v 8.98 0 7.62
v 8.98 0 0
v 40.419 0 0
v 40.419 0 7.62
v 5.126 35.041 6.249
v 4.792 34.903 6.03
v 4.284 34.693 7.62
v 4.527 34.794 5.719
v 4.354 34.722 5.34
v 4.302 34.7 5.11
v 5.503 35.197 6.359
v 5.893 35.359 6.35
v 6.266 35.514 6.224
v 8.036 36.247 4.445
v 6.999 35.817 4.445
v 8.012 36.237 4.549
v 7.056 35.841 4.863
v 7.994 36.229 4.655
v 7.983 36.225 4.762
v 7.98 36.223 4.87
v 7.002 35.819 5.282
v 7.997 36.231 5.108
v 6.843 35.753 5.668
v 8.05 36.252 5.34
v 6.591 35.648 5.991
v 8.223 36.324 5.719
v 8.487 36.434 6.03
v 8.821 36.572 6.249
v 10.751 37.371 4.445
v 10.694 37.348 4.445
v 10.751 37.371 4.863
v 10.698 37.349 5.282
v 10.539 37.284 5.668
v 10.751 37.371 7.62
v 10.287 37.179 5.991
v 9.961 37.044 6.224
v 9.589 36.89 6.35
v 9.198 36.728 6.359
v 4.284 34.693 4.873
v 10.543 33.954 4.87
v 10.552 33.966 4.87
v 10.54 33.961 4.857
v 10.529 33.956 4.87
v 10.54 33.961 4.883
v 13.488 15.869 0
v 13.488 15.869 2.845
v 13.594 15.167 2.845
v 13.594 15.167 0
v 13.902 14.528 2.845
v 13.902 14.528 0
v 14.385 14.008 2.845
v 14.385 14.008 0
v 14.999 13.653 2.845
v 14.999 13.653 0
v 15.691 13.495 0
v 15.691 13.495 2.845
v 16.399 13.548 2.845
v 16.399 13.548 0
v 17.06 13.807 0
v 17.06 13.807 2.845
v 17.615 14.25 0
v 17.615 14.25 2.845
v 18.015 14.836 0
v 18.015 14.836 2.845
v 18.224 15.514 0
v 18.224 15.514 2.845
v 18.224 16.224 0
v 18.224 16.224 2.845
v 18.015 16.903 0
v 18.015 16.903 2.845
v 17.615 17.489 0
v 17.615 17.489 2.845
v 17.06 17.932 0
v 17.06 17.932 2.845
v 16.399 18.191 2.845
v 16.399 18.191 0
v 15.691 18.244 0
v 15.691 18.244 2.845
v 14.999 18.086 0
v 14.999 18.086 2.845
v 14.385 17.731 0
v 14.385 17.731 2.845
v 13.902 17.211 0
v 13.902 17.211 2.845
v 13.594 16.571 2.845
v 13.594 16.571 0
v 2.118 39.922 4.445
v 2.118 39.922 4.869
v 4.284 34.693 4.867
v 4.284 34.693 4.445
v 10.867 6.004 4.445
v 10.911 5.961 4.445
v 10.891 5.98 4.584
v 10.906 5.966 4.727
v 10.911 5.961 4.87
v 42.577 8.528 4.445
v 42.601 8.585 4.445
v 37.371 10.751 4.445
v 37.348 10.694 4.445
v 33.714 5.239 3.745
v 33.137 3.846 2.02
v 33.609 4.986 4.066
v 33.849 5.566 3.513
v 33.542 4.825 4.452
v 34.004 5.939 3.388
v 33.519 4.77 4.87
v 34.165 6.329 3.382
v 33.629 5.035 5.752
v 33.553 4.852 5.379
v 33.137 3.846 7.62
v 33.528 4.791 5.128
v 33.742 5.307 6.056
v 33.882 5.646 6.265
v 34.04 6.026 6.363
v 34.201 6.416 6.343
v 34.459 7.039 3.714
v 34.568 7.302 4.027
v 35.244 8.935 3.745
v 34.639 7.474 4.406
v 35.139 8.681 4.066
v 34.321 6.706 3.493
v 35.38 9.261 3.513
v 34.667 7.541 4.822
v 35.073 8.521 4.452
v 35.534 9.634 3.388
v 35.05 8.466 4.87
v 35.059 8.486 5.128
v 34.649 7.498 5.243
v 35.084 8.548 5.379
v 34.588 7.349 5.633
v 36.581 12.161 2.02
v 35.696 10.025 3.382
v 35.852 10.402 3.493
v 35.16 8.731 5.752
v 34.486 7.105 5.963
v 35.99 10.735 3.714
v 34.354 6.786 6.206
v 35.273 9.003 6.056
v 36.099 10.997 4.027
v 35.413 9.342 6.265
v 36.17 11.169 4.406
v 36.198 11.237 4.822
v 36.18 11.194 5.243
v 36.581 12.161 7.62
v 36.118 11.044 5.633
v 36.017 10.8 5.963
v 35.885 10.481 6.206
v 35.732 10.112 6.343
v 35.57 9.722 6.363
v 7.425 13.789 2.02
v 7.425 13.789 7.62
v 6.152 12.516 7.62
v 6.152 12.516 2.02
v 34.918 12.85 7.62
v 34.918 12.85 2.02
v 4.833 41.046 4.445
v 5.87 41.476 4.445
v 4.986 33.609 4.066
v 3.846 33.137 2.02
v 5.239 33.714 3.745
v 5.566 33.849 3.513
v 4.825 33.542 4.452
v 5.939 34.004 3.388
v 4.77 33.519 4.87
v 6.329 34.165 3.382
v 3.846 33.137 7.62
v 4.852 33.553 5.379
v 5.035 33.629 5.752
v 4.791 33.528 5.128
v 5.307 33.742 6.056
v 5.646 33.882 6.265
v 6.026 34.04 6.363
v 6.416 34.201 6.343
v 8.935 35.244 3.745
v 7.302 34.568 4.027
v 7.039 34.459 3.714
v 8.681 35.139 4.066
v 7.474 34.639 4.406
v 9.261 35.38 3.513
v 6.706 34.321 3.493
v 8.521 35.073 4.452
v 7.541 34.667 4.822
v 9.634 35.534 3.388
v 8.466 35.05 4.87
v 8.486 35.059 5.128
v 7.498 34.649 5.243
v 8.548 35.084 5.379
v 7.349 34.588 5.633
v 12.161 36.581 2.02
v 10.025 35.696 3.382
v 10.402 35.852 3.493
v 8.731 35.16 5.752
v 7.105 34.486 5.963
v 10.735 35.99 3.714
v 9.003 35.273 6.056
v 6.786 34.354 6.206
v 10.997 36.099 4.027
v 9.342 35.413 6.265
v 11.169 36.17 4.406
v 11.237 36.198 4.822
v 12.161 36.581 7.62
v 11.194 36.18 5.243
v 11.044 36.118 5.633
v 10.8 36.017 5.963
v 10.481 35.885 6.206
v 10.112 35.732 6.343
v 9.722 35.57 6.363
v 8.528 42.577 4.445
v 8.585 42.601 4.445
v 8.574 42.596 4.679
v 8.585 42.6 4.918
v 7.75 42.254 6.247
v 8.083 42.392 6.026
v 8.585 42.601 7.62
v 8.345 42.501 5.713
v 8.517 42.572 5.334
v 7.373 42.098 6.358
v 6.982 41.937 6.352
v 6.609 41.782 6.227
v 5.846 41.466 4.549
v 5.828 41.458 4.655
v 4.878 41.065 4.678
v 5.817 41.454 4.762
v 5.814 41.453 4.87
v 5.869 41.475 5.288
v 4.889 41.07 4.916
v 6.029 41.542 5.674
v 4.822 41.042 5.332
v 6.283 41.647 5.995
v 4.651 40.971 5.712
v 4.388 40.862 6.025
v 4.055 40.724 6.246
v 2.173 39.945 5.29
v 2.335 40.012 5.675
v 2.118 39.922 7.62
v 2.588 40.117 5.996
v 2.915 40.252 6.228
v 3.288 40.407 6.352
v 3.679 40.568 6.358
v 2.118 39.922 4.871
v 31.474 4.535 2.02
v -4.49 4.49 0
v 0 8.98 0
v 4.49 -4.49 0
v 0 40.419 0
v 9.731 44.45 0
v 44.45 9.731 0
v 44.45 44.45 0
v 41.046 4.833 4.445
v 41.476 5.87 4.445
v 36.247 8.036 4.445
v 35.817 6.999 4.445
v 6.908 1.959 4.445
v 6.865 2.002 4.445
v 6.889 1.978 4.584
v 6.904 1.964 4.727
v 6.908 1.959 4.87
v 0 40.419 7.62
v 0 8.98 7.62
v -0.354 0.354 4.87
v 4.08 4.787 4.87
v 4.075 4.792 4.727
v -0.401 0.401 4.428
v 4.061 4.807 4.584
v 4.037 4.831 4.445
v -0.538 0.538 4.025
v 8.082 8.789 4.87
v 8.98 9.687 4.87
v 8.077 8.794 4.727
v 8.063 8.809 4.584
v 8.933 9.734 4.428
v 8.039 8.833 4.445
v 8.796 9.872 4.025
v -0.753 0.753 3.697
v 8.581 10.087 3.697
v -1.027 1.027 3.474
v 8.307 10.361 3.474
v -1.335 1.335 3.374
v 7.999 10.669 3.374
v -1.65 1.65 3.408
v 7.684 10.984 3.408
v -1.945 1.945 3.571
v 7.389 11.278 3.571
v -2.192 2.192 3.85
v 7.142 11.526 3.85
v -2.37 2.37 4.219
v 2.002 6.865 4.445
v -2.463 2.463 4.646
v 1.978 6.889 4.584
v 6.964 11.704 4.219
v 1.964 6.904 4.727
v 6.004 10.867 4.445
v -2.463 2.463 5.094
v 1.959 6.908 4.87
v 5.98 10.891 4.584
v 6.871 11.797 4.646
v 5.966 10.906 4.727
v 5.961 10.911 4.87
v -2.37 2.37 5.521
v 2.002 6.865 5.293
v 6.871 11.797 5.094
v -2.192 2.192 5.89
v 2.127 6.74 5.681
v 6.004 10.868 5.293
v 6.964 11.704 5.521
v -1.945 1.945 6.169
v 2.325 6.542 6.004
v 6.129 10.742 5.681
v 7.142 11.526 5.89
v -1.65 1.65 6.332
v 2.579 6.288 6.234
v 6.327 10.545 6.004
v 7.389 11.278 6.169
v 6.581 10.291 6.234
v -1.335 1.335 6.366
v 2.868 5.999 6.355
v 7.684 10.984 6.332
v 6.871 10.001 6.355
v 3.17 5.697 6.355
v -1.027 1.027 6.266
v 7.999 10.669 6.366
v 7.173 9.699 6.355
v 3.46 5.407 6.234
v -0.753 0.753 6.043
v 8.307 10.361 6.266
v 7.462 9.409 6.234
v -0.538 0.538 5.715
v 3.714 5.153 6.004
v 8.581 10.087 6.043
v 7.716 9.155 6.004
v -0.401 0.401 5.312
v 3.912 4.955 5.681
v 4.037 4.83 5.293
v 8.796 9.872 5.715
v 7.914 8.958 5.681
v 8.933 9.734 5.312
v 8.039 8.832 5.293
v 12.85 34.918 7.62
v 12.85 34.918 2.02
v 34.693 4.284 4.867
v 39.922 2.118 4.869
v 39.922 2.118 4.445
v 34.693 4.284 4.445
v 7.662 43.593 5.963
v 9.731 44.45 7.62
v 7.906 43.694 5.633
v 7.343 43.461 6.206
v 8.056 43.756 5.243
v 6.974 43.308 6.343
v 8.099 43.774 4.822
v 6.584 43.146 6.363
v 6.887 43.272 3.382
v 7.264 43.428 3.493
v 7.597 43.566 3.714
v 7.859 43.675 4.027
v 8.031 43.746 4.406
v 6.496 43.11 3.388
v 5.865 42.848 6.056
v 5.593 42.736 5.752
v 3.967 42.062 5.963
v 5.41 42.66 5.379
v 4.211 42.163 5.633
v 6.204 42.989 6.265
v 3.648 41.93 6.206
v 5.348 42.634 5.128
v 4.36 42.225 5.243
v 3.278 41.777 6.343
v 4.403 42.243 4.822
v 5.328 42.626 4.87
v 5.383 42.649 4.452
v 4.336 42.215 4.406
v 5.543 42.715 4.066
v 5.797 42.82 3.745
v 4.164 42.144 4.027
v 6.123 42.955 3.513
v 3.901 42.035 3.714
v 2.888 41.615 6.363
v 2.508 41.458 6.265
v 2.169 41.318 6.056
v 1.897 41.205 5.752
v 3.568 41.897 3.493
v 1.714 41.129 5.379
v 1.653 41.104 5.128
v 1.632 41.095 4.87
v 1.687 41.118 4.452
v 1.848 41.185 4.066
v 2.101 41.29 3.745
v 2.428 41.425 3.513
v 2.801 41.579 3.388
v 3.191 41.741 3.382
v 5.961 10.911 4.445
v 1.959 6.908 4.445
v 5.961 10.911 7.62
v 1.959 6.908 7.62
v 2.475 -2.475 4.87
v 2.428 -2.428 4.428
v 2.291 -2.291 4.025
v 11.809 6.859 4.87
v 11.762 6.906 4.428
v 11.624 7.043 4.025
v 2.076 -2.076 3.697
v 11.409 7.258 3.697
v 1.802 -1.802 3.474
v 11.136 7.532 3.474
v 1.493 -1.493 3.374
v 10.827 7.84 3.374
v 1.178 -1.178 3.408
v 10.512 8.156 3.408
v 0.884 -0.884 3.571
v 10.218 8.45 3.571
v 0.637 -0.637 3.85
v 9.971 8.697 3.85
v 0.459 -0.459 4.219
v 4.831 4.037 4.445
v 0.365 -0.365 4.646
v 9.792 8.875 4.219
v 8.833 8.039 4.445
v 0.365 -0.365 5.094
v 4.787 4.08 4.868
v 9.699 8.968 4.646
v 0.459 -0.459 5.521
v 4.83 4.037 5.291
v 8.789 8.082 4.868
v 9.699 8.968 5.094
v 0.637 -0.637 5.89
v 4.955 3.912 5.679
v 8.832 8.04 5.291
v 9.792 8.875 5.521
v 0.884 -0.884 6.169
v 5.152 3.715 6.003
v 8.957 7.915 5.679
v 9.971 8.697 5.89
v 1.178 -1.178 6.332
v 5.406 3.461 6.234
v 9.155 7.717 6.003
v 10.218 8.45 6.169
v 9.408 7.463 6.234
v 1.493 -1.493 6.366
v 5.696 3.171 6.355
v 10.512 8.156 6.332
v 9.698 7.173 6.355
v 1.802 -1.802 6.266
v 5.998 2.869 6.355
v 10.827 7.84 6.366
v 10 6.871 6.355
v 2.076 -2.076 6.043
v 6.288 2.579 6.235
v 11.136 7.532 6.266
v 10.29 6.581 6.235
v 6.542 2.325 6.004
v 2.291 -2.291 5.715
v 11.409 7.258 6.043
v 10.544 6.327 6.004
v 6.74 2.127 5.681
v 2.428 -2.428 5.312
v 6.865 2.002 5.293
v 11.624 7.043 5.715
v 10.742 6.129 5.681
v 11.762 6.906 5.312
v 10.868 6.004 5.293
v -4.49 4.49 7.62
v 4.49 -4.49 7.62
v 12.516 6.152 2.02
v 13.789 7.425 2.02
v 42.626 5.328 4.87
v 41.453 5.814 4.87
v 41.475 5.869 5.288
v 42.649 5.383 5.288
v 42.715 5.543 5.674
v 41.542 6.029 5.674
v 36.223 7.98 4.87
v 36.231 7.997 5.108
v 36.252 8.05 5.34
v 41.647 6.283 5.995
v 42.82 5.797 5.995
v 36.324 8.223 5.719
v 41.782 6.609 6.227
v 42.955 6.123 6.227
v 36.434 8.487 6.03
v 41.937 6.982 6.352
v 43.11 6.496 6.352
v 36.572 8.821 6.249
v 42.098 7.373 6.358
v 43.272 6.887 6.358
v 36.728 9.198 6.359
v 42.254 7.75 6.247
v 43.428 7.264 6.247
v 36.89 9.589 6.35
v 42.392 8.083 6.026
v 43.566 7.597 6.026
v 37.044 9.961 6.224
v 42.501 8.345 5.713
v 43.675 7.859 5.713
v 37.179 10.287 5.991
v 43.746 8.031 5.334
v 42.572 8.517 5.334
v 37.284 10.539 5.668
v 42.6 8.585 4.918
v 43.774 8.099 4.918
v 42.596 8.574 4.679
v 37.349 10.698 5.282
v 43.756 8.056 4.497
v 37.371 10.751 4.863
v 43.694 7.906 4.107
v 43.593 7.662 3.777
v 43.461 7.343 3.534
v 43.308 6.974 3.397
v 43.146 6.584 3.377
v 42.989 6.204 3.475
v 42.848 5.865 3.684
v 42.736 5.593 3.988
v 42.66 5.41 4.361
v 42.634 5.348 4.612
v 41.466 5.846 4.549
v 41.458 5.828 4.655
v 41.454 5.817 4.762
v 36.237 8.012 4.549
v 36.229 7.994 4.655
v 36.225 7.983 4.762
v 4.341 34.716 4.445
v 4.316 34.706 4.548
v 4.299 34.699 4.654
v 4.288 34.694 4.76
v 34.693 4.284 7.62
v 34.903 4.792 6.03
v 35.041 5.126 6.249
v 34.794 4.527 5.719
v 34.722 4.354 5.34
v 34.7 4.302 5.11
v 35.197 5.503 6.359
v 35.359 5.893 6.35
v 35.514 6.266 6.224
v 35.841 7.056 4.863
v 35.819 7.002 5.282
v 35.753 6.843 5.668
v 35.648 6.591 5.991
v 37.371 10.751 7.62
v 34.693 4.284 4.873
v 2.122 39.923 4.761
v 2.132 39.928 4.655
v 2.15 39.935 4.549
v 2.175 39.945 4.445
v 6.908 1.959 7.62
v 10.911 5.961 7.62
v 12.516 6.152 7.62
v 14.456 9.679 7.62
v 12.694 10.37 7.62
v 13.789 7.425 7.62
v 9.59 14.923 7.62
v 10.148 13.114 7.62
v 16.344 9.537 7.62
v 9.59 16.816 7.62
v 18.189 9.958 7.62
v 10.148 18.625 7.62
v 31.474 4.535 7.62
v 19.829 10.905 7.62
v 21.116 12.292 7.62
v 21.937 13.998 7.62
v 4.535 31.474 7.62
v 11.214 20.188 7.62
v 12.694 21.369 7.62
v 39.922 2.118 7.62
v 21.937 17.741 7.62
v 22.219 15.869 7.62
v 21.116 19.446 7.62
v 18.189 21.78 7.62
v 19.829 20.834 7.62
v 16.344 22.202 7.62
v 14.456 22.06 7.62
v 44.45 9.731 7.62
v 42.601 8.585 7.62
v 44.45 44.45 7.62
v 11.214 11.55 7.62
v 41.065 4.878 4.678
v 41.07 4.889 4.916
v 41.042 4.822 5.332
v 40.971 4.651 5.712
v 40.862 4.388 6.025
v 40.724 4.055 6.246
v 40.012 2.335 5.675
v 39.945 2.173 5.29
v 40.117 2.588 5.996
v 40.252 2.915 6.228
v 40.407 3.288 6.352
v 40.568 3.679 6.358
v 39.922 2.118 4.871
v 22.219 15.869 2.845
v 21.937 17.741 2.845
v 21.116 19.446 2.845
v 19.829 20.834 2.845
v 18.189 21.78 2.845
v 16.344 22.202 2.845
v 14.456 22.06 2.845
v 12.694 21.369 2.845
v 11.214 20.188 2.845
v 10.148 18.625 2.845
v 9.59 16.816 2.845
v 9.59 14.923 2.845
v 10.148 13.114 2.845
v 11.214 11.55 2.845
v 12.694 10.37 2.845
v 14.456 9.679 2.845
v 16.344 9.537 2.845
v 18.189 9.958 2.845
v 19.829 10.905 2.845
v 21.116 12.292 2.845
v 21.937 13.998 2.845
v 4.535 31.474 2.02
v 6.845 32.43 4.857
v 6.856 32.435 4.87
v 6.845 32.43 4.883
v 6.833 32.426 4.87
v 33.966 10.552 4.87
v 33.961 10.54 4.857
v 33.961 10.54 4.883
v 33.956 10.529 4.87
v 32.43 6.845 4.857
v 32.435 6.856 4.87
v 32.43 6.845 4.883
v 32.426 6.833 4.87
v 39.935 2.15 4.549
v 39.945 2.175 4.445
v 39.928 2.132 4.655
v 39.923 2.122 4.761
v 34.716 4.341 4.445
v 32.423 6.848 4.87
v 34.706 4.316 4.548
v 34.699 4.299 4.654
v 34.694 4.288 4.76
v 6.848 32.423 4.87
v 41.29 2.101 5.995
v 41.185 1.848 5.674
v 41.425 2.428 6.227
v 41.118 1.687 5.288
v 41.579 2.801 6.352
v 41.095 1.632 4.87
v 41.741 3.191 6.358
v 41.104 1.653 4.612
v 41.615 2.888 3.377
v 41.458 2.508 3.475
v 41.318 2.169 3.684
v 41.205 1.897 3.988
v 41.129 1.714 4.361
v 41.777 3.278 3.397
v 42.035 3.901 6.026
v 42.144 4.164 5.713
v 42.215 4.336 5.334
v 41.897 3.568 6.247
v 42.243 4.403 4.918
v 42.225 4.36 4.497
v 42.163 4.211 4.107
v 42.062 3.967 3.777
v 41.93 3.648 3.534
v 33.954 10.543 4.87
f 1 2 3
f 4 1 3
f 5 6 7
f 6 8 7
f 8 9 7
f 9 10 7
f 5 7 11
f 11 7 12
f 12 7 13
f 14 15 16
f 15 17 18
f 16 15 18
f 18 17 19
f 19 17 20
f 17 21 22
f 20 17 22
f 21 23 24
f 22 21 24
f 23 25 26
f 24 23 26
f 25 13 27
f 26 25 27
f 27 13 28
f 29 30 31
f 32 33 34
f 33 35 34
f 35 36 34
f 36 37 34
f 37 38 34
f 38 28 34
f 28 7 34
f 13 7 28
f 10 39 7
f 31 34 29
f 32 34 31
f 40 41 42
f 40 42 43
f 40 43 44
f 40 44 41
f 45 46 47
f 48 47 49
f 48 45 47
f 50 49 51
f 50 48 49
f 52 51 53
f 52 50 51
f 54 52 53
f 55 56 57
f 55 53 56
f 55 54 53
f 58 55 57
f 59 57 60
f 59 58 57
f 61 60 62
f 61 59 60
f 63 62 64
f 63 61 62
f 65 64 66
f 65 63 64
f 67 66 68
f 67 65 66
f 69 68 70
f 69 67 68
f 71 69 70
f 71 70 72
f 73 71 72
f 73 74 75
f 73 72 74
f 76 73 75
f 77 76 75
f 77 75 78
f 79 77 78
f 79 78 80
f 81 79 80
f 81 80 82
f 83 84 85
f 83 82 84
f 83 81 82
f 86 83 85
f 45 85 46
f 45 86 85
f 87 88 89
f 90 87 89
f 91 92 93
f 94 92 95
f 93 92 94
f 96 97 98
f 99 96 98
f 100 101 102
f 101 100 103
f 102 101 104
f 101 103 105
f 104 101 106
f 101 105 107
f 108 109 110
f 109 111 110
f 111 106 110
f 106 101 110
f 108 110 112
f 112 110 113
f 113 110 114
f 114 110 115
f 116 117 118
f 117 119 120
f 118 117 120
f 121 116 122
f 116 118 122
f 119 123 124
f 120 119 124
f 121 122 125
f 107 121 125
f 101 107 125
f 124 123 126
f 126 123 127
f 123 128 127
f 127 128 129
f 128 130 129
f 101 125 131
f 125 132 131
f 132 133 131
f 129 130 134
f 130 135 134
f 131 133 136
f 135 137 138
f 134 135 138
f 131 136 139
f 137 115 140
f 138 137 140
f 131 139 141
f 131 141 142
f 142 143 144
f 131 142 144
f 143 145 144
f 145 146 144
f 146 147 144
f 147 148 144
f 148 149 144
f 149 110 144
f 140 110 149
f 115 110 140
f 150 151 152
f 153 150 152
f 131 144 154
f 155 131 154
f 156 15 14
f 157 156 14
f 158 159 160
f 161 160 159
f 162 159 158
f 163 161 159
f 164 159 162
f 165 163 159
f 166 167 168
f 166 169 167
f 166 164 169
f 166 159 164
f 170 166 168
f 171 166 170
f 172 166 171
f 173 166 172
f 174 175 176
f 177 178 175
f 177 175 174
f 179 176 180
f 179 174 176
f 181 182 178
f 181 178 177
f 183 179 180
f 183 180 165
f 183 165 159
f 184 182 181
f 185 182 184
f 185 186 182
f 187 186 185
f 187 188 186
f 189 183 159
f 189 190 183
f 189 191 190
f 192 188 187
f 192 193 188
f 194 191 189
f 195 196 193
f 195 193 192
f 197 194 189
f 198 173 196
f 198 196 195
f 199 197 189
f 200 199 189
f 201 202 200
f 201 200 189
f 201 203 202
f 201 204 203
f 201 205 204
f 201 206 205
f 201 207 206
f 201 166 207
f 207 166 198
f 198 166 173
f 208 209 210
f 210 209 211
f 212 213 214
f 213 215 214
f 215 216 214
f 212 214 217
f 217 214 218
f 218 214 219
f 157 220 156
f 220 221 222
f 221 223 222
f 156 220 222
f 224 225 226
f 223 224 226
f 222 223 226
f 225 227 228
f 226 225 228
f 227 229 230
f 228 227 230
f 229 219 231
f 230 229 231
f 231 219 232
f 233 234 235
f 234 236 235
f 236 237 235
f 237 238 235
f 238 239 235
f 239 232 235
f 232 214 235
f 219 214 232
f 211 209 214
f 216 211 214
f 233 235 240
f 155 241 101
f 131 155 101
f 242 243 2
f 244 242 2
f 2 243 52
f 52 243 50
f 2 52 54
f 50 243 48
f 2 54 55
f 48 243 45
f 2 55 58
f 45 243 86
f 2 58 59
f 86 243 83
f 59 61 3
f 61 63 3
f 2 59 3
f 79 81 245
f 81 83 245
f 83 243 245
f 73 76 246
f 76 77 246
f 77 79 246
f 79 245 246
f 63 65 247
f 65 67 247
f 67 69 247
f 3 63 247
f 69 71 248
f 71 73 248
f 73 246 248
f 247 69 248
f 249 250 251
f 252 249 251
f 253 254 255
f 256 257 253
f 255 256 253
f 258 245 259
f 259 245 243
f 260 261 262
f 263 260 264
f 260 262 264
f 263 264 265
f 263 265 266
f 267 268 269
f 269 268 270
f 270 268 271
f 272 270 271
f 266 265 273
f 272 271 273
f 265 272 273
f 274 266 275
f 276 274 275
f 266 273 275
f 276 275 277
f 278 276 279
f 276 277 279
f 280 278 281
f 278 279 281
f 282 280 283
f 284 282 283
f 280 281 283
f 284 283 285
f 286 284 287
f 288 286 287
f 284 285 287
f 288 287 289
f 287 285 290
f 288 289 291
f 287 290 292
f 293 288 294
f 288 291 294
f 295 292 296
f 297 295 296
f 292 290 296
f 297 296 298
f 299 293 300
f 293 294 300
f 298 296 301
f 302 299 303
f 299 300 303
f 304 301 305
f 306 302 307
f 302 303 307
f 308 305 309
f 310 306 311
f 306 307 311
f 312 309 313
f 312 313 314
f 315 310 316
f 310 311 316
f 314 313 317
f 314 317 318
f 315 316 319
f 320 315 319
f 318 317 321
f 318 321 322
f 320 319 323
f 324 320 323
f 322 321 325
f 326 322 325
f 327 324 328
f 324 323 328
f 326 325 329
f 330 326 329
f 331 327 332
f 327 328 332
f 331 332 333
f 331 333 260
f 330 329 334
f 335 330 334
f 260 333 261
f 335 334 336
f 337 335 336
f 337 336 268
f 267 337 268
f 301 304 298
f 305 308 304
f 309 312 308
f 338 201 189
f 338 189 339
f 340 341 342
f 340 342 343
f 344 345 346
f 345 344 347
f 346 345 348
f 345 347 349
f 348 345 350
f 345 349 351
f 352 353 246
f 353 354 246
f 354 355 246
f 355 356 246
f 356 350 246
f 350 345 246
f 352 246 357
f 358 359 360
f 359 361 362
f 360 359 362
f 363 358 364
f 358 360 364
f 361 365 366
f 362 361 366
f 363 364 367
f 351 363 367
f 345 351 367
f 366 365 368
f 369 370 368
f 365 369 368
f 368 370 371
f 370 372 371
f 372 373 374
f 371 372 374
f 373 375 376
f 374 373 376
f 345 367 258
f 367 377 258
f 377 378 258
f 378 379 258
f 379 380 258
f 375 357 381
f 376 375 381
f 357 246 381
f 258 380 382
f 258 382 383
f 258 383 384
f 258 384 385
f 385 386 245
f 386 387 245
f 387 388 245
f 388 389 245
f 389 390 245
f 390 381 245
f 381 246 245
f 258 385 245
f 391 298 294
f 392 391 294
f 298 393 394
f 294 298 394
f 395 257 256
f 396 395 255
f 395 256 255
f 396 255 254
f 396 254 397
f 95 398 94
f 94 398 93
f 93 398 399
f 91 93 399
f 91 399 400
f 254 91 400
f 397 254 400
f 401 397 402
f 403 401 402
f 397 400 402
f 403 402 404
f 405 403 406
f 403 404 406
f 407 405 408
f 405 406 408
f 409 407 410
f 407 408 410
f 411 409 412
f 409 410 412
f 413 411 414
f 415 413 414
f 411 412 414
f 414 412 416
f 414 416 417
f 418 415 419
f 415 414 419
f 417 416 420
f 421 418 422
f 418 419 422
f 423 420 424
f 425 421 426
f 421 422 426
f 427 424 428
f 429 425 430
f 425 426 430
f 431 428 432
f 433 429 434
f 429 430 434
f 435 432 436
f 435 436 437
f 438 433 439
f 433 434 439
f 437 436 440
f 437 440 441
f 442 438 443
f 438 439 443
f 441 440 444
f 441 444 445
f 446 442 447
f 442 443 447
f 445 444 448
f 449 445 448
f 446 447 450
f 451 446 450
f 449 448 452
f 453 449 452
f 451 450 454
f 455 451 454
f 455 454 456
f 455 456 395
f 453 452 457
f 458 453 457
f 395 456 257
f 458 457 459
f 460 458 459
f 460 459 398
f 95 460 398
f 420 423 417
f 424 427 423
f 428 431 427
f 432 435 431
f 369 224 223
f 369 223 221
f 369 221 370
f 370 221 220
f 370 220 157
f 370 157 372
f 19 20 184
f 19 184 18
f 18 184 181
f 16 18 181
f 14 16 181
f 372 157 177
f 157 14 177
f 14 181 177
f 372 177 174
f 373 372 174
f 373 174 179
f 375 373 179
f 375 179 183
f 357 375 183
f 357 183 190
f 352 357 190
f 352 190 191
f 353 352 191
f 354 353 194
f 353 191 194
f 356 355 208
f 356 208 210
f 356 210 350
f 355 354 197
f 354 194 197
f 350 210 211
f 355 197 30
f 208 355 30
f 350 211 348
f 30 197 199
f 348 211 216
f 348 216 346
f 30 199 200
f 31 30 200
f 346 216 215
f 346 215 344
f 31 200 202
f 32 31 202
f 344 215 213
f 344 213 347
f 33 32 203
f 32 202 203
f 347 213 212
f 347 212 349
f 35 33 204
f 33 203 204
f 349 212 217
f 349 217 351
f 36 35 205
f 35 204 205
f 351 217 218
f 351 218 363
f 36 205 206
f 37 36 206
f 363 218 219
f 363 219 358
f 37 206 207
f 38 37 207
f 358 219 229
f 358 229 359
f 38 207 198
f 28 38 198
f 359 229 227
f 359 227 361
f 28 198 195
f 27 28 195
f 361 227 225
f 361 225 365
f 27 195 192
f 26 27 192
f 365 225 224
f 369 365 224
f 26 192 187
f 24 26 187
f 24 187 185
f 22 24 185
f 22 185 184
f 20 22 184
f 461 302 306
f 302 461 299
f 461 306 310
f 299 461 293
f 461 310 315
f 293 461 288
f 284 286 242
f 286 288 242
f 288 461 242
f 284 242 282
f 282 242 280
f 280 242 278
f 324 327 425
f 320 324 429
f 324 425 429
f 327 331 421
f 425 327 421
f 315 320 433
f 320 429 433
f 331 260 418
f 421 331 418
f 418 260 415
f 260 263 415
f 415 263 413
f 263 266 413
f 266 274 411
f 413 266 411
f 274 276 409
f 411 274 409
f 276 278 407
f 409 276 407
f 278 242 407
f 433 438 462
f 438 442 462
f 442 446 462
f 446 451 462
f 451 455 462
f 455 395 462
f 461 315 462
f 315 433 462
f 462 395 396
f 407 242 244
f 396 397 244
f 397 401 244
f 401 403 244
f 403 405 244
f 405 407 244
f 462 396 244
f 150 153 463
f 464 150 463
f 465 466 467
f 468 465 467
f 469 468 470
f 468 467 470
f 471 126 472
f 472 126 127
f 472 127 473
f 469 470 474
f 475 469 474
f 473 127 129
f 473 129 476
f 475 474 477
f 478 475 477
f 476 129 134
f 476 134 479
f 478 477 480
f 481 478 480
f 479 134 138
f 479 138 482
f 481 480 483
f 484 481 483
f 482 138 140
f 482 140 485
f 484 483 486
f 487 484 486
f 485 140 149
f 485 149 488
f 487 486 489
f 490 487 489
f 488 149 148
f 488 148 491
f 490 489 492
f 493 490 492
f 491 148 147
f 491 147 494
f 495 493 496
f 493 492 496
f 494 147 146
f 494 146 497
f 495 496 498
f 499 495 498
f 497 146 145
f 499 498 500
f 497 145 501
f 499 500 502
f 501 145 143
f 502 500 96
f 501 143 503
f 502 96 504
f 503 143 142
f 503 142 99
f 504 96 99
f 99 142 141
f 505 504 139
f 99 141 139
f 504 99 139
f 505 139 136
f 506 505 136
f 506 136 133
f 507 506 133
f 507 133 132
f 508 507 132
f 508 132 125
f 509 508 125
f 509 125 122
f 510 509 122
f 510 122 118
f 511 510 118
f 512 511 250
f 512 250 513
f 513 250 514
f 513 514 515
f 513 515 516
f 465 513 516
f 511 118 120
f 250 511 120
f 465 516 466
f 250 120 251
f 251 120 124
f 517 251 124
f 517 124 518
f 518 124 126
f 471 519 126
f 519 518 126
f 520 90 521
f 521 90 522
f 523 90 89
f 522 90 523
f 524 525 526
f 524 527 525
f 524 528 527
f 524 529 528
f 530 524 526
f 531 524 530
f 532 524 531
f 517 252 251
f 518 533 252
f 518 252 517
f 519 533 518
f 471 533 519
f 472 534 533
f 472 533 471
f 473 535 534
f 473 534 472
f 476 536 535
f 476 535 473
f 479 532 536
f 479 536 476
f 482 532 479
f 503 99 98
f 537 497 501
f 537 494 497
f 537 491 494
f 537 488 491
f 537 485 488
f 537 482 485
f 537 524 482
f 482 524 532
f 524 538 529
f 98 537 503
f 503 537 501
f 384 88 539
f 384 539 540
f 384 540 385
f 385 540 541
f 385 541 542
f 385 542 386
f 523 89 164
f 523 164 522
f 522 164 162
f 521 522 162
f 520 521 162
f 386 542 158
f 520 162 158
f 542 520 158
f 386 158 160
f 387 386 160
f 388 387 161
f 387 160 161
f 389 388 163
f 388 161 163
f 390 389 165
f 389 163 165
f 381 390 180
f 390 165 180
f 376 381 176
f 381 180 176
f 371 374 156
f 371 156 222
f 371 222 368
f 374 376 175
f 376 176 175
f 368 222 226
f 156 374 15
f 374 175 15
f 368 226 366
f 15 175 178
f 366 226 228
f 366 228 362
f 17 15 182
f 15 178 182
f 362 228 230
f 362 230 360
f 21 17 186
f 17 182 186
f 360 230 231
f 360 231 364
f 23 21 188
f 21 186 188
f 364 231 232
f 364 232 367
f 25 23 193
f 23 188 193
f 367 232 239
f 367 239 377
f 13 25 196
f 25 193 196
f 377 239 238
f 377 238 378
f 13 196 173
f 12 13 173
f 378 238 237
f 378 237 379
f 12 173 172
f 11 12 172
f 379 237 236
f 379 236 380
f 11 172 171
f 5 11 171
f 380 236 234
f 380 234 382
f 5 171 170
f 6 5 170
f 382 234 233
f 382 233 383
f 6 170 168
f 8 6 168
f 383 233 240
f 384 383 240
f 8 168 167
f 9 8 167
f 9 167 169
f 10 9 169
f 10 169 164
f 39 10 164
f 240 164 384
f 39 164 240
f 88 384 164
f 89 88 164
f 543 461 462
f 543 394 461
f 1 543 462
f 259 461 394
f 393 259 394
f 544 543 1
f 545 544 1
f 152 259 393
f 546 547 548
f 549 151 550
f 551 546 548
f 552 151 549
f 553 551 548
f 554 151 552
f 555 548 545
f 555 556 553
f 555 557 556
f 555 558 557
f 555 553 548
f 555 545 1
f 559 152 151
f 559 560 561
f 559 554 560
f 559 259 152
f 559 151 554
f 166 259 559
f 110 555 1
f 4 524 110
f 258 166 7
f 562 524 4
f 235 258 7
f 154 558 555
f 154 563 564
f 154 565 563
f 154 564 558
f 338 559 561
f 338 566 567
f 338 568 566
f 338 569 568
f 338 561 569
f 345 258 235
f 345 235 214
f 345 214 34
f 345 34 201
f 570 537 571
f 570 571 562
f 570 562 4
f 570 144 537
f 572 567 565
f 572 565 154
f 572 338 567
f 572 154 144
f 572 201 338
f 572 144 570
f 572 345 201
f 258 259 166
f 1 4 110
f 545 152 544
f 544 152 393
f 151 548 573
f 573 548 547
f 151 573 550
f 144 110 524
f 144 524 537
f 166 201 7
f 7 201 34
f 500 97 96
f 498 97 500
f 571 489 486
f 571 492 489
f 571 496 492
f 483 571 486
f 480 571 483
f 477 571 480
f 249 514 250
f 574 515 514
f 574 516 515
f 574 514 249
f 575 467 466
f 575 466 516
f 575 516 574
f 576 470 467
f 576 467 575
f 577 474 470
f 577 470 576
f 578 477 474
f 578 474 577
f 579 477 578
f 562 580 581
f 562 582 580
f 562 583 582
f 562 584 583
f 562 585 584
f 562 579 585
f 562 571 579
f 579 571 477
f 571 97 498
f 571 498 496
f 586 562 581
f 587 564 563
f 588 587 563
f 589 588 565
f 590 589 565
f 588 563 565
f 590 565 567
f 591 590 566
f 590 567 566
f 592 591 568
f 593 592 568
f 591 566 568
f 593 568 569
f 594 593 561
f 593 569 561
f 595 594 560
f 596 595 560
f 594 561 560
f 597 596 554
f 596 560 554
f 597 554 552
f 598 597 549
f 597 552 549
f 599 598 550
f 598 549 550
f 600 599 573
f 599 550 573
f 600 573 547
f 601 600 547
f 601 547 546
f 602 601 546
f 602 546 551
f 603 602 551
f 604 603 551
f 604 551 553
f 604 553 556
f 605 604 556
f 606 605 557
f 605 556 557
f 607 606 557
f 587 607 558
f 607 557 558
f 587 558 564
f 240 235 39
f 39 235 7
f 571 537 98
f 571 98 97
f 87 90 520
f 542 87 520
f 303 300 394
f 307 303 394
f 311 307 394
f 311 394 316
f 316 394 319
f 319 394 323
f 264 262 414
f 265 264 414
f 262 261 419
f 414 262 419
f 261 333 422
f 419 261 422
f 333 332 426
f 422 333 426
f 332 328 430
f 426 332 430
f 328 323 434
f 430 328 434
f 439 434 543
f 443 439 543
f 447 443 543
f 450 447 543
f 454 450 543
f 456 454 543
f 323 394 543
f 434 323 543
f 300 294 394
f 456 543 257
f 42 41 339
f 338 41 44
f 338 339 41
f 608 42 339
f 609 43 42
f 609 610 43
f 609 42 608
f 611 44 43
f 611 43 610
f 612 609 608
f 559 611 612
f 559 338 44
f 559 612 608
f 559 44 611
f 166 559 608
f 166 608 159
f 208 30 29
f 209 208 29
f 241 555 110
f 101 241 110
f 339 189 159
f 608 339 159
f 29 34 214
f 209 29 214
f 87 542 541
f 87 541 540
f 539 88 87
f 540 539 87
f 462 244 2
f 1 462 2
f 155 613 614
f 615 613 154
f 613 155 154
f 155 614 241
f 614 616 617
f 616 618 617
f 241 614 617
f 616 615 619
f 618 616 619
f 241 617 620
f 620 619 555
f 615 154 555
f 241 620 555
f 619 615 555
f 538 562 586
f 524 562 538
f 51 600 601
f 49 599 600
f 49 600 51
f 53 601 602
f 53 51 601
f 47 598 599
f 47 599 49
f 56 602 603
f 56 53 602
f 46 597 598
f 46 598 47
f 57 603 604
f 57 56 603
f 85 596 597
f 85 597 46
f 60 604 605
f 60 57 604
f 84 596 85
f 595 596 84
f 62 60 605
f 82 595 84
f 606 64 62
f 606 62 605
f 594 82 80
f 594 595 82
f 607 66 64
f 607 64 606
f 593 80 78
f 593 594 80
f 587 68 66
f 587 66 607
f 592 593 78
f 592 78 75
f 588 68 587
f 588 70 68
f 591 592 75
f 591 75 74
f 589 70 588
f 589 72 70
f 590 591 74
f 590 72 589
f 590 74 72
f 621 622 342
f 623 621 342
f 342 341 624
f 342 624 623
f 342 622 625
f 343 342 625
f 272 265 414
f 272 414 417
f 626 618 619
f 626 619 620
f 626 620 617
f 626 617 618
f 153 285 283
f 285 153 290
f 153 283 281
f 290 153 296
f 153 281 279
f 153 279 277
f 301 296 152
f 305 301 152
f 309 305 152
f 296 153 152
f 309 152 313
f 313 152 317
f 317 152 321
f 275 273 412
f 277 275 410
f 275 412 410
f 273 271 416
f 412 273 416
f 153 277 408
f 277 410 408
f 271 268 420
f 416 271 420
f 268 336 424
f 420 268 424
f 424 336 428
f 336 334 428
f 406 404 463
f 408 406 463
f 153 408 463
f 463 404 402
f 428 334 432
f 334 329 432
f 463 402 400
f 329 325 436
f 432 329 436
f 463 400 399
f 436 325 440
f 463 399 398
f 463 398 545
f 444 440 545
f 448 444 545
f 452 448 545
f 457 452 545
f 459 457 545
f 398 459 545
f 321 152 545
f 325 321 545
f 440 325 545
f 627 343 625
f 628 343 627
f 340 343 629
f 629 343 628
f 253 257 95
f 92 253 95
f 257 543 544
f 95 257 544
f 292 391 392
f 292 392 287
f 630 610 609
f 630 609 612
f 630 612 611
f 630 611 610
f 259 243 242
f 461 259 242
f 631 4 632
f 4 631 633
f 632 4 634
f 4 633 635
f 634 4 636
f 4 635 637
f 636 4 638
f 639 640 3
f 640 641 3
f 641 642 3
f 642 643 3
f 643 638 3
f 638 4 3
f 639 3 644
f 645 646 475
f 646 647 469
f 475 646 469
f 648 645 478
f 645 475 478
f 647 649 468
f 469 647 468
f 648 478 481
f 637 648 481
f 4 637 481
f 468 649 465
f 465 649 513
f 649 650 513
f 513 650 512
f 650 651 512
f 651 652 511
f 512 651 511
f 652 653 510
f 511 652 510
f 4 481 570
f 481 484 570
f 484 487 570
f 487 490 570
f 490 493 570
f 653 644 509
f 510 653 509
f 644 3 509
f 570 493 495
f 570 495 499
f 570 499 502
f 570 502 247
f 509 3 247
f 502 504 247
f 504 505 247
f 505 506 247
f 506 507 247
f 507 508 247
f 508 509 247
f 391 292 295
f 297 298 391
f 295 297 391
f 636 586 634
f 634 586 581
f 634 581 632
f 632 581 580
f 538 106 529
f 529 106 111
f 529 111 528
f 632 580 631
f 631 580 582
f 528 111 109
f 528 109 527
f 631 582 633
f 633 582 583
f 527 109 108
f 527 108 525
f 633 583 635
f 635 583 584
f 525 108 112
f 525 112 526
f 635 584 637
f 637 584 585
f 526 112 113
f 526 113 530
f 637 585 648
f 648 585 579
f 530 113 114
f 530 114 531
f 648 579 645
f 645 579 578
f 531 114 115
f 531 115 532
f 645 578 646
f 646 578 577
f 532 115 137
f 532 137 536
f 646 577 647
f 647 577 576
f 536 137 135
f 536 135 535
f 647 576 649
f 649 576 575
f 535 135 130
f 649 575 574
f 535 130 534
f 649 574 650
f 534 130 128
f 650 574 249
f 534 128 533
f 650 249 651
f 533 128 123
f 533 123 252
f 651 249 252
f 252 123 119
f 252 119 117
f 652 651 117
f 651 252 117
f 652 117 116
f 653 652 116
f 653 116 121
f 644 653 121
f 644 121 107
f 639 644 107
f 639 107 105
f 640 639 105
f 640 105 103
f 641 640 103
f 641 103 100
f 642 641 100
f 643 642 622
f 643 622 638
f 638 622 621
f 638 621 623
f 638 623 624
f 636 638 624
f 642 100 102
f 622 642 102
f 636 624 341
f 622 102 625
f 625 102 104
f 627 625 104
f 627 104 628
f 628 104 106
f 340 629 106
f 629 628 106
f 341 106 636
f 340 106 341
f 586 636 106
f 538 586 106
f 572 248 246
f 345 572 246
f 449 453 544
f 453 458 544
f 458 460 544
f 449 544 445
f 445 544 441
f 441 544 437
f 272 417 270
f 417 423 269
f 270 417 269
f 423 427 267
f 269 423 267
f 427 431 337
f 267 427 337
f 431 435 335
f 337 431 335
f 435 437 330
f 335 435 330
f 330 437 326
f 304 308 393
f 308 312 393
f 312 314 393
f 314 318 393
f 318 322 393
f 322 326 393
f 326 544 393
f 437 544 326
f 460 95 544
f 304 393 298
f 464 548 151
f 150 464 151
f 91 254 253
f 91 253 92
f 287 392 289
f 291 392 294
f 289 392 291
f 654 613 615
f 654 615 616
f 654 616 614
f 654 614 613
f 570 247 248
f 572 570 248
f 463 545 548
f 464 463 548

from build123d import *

# Parameters (mm, degrees)
SKETCH1_R                           = 2.38125
BOSS_EXTRUDE1_DEPTH                 = 7.62
MAGNET_START                        = 7.62
SKETCH1_3_R                         = 6.35
MAGNET_HOLE_DEPTH                   = 4.7752
CUT_EXTRUDE2_START                  = 7.62
CUT_EXTRUDE2_DEPTH                  = 5.6
F_3_0MM_DOWEL_HOLE1_D               = 3
F_3_0MM_DOWEL_HOLE1_DEPTH           = 9.106309071
F_3_0MM_DOWEL_HOLE1_TIP             = 0.901290929
F_3_0MM_DOWEL_HOLE1_ON_FACE_2_D     = 3
F_3_0MM_DOWEL_HOLE1_ON_FACE_2_DEPTH = 9.106309071
F_3_0MM_DOWEL_HOLE1_ON_FACE_2_TIP   = 0.901290929
F_3_0MM_DOWEL_HOLE1_ON_FACE_3_D     = 3
F_3_0MM_DOWEL_HOLE1_ON_FACE_3_DEPTH = 9.106309071
F_3_0MM_DOWEL_HOLE1_ON_FACE_3_TIP   = 0.901290929
F_3_0MM_DOWEL_HOLE1_ON_FACE_4_D     = 3
F_3_0MM_DOWEL_HOLE1_ON_FACE_4_DEPTH = 9.106309071
F_3_0MM_DOWEL_HOLE1_ON_FACE_4_TIP   = 0.901290929
F_3_0MM_DOWEL_HOLE1_ON_FACE_5_D     = 3
F_3_0MM_DOWEL_HOLE1_ON_FACE_5_DEPTH = 9.106309071
F_3_0MM_DOWEL_HOLE1_ON_FACE_5_TIP   = 0.901290929
F_3_0MM_DOWEL_HOLE2_D               = 3
F_3_0MM_DOWEL_HOLE2_DEPTH           = 13.2
CUT_EXTRUDE3_START                  = 7.62
CUT_EXTRUDE3_DEPTH                  = 3.175


with BuildPart() as part:
    # Sketch1 → Boss-Extrude1 (new body)
    with BuildSketch(Plane.XY):
        Polygon((44.45, 44.45), (9.731339272, 44.45), (0, 40.419147293), (0, 8.980256121), (-4.490128061, 4.490128061), (4.490128061, -4.490128061), (8.980256121, 0), (40.419147293, 0), (44.45, 9.731339272), align=None)
        with Locations(Location((15.869346859, 15.869346859, 0), (0, 0, 180))):
            Circle(SKETCH1_R, mode=Mode.SUBTRACT)
    extrude(amount=BOSS_EXTRUDE1_DEPTH)

    # Sketch1<3> → Magnet Hole (cut)
    with BuildSketch(Plane.XY.offset(MAGNET_START)):
        with Locations((15.869346859, 15.869346859)):
            Circle(SKETCH1_3_R)
    extrude(amount=-MAGNET_HOLE_DEPTH, mode=Mode.SUBTRACT)

    # Sketch1<4> → Cut-Extrude2 (cut)
    with BuildSketch(Plane.XY.offset(CUT_EXTRUDE2_START)):
        Polygon((36.580836926, 12.161131678), (34.917853767, 12.849961856), (31.473702876, 4.535046063), (33.136686034, 3.846215885), align=None)
        Polygon((6.151828996, 12.515790027), (12.515790027, 6.151828996), (13.788582233, 7.424621202), (7.424621202, 13.788582233), align=None)
        Polygon((12.161131678, 36.580836926), (12.849961856, 34.917853767), (4.535046063, 31.473702876), (3.846215885, 33.136686034), align=None)
    extrude(amount=-CUT_EXTRUDE2_DEPTH, mode=Mode.SUBTRACT)

    # Ø3.0mm Dowel Hole1
    with Locations(Plane(origin=(-1.414213562, 1.414213562, 4.87), x_dir=(-0.707106781187, 0.707106781187, 0), z_dir=(-0.707106781187, -0.707106781187, 0))):
        with Locations((1e-09, 0), (-3.999999999, 0)):
            Hole(F_3_0MM_DOWEL_HOLE1_D / 2, depth=F_3_0MM_DOWEL_HOLE1_DEPTH)
            with Locations((0, 0, -(F_3_0MM_DOWEL_HOLE1_DEPTH + F_3_0MM_DOWEL_HOLE1_TIP / 2))):  # 118° drill point
                Cone(0, F_3_0MM_DOWEL_HOLE1_D / 2, F_3_0MM_DOWEL_HOLE1_TIP, mode=Mode.SUBTRACT)

    # Ø3.0mm Dowel Hole1 on face 2
    with Locations(Plane(origin=(43.199940511, 6.713428701, 4.87), x_dir=(0.382682898036, 0.923879753837, 0), z_dir=(0.923879753837, -0.382682898036, 0))):
        with Locations((0, 0)):
            Hole(F_3_0MM_DOWEL_HOLE1_ON_FACE_2_D / 2, depth=F_3_0MM_DOWEL_HOLE1_ON_FACE_2_DEPTH)
            with Locations((0, 0, -(F_3_0MM_DOWEL_HOLE1_ON_FACE_2_DEPTH + F_3_0MM_DOWEL_HOLE1_ON_FACE_2_TIP / 2))):  # 118° drill point
                Cone(0, F_3_0MM_DOWEL_HOLE1_ON_FACE_2_D / 2, F_3_0MM_DOWEL_HOLE1_ON_FACE_2_TIP, mode=Mode.SUBTRACT)

    # Ø3.0mm Dowel Hole1 on face 3
    with Locations(Plane(origin=(41.669206782, 3.017910571, 4.87), x_dir=(0.382682898036, 0.923879753837, 0), z_dir=(0.923879753837, -0.382682898036, 0))):
        with Locations((0, 0)):
            Hole(F_3_0MM_DOWEL_HOLE1_ON_FACE_3_D / 2, depth=F_3_0MM_DOWEL_HOLE1_ON_FACE_3_DEPTH)
            with Locations((0, 0, -(F_3_0MM_DOWEL_HOLE1_ON_FACE_3_DEPTH + F_3_0MM_DOWEL_HOLE1_ON_FACE_3_TIP / 2))):  # 118° drill point
                Cone(0, F_3_0MM_DOWEL_HOLE1_ON_FACE_3_D / 2, F_3_0MM_DOWEL_HOLE1_ON_FACE_3_TIP, mode=Mode.SUBTRACT)

    # Ø3.0mm Dowel Hole1 on face 4
    with Locations(Plane(origin=(3.017910571, 41.669206782, 4.87), x_dir=(0.923879753837, 0.382682898036, 0), z_dir=(-0.382682898036, 0.923879753837, 0))):
        with Locations((0, 0)):
            Hole(F_3_0MM_DOWEL_HOLE1_ON_FACE_4_D / 2, depth=F_3_0MM_DOWEL_HOLE1_ON_FACE_4_DEPTH)
            with Locations((0, 0, -(F_3_0MM_DOWEL_HOLE1_ON_FACE_4_DEPTH + F_3_0MM_DOWEL_HOLE1_ON_FACE_4_TIP / 2))):  # 118° drill point
                Cone(0, F_3_0MM_DOWEL_HOLE1_ON_FACE_4_D / 2, F_3_0MM_DOWEL_HOLE1_ON_FACE_4_TIP, mode=Mode.SUBTRACT)

    # Ø3.0mm Dowel Hole1 on face 5
    with Locations(Plane(origin=(6.713428701, 43.199940511, 4.87), x_dir=(0.923879753837, 0.382682898036, 0), z_dir=(-0.382682898036, 0.923879753837, 0))):
        with Locations((0, 0)):
            Hole(F_3_0MM_DOWEL_HOLE1_ON_FACE_5_D / 2, depth=F_3_0MM_DOWEL_HOLE1_ON_FACE_5_DEPTH)
            with Locations((0, 0, -(F_3_0MM_DOWEL_HOLE1_ON_FACE_5_DEPTH + F_3_0MM_DOWEL_HOLE1_ON_FACE_5_TIP / 2))):  # 118° drill point
                Cone(0, F_3_0MM_DOWEL_HOLE1_ON_FACE_5_D / 2, F_3_0MM_DOWEL_HOLE1_ON_FACE_5_TIP, mode=Mode.SUBTRACT)

    # Ø3.0mm Dowel Hole2
    with Locations(Plane(origin=(0, 0, 0), x_dir=(-0.7071067811865495, 0.7071067811865457, 0), z_dir=(-0.7071067811865457, -0.7071067811865495, 0))):
        with Locations((-2, -4.87), (2, -4.87)):
            Hole(F_3_0MM_DOWEL_HOLE2_D / 2, depth=F_3_0MM_DOWEL_HOLE2_DEPTH)

    # Sketch1<5> → Cut-Extrude3 (cut)
    with BuildSketch(Plane.XY.offset(CUT_EXTRUDE3_START)):
        Polygon((5.960910165, 10.910657634), (1.958685784, 6.908433252), (6.908433252, 1.958685784), (10.910657634, 5.960910165), align=None)
        Polygon((2.118099231, 39.921854627), (4.284087459, 34.692696473), (10.751244186, 37.3714805), (8.585255959, 42.600638654), align=None)
        Polygon((37.3714805, 10.751244186), (42.600638654, 8.585255959), (39.921854627, 2.118099231), (34.692696473, 4.284087459), align=None)
    extrude(amount=-CUT_EXTRUDE3_DEPTH, mode=Mode.SUBTRACT)


solid = part.part
